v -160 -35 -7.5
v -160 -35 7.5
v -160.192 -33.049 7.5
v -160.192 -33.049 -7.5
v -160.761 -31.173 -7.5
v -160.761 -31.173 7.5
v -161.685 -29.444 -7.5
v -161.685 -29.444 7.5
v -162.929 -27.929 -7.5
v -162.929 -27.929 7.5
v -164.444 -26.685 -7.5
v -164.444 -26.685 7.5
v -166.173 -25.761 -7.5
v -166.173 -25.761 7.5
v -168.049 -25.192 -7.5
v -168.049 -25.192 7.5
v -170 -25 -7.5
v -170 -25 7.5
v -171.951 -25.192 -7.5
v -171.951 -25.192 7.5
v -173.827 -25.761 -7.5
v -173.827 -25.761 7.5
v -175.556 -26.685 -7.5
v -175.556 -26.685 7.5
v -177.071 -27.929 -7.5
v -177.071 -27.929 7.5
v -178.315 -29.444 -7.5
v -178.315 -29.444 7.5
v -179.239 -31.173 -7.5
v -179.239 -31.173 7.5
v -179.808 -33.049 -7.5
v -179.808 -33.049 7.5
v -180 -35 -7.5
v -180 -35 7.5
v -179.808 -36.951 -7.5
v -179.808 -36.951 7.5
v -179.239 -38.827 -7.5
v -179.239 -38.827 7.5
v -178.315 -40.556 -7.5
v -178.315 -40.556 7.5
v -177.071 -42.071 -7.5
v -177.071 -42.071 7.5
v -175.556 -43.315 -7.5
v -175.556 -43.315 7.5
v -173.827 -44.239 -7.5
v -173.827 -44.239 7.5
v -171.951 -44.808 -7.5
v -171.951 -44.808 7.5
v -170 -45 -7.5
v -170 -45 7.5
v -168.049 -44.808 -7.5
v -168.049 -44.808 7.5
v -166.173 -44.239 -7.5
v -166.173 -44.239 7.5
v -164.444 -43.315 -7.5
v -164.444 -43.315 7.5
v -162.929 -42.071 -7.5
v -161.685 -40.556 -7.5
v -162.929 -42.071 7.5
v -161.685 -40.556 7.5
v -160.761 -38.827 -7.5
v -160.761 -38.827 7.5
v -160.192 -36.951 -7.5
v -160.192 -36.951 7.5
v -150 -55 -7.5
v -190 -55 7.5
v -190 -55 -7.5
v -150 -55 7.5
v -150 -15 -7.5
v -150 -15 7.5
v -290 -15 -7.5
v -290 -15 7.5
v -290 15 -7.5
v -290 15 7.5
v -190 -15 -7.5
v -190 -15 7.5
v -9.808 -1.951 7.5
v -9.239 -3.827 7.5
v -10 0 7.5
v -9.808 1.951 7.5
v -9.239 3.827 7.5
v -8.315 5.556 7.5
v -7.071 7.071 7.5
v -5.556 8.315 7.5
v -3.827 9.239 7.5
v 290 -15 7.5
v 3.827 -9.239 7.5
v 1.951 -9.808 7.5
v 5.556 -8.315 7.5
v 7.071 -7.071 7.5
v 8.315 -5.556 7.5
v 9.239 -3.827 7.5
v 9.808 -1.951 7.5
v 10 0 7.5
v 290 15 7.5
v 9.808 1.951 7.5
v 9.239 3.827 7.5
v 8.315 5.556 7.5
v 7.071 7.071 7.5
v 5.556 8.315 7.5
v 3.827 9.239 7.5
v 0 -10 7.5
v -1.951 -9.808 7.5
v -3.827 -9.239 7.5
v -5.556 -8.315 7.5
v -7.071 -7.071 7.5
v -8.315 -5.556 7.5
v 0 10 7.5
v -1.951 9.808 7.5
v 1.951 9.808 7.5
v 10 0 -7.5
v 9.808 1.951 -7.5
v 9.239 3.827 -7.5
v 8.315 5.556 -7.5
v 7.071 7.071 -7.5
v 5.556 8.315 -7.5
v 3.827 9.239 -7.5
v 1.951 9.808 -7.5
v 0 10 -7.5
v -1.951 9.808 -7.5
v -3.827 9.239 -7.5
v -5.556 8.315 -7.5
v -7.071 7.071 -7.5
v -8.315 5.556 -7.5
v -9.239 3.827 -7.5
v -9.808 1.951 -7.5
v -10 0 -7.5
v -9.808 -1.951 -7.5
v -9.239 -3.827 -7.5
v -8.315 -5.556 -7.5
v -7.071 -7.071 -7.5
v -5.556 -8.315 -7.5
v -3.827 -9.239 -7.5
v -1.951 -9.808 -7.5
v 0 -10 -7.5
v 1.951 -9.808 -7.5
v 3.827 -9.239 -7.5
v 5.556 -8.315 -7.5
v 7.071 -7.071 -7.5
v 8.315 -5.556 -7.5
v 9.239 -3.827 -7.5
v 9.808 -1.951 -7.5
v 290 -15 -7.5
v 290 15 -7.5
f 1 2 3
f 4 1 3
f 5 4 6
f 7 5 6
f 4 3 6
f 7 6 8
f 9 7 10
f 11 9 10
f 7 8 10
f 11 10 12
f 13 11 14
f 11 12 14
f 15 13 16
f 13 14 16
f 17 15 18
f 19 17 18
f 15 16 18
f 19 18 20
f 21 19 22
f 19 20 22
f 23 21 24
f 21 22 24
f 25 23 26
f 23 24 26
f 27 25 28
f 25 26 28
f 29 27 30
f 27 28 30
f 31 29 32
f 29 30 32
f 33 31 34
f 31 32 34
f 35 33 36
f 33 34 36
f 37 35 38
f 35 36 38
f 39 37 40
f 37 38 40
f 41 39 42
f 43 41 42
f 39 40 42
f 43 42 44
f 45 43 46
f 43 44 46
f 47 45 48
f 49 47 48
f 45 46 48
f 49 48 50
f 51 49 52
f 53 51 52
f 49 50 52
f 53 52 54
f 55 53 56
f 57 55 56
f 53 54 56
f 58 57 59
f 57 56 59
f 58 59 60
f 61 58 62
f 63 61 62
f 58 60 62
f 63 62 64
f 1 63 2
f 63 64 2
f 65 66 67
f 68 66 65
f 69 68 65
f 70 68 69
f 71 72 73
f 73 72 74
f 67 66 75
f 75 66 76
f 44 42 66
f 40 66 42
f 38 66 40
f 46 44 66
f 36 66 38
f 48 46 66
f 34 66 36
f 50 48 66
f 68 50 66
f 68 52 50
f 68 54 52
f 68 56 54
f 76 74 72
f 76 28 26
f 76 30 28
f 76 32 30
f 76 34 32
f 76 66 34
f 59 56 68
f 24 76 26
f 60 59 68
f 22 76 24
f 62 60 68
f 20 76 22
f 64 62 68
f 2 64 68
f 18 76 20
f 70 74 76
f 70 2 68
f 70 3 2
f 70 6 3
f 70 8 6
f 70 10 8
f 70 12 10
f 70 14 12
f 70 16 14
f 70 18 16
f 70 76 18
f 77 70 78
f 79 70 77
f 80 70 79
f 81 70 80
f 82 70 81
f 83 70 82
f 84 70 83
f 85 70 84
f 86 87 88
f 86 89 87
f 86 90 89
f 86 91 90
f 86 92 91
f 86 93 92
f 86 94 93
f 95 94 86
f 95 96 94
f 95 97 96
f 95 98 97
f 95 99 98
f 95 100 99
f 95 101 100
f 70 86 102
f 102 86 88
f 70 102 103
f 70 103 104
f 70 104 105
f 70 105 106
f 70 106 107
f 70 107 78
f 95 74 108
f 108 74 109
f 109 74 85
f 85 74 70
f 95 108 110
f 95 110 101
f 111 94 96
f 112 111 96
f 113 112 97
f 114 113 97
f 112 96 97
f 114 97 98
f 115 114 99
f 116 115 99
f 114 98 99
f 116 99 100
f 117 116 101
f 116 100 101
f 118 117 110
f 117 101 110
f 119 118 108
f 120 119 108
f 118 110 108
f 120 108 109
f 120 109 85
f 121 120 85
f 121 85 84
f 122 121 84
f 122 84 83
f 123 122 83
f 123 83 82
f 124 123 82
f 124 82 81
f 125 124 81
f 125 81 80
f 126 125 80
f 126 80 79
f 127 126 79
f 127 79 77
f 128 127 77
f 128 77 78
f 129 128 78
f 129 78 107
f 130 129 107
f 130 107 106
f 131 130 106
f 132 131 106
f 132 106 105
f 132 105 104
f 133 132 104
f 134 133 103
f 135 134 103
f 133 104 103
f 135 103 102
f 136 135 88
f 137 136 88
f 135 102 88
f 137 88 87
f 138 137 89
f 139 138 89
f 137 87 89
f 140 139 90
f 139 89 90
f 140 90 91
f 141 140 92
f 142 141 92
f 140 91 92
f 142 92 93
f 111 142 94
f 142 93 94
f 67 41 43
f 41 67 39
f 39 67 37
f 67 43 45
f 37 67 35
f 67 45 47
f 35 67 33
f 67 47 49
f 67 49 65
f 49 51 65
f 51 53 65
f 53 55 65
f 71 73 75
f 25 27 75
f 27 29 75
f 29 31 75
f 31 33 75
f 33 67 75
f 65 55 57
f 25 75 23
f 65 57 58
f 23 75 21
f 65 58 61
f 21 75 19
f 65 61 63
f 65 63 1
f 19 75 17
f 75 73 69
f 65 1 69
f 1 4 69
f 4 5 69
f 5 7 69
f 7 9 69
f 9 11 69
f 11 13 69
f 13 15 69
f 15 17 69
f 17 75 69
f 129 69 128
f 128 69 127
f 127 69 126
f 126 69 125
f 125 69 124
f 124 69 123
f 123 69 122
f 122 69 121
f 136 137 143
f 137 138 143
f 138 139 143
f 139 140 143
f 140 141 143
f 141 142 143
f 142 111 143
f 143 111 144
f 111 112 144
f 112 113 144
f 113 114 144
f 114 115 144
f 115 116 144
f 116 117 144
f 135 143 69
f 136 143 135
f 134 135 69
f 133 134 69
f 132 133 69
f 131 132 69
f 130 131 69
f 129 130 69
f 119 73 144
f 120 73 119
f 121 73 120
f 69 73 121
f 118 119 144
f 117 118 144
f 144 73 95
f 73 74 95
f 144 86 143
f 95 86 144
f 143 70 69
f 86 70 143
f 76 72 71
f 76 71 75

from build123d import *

# Parameters (mm, degrees)
SKETCH1_W           = 580
SKETCH1_H           = 30
BOSS_EXTRUDE1_DEPTH = 7.5
SKETCH2_R           = 10
CUT_EXTRUDE1_DEPTH  = 20
SKETCH3_W           = 40
SKETCH3_H           = 40
SKETCH3_R           = 10
BOSS_EXTRUDE2_DEPTH = 15


with BuildPart() as part:
    # Sketch1 → Boss-Extrude1 (new body, symmetric)
    with BuildSketch(Plane.XY):
        Rectangle(SKETCH1_W, SKETCH1_H)
    extrude(amount=BOSS_EXTRUDE1_DEPTH, both=True)

    # Sketch2 → Cut-Extrude1 (cut)
    with BuildSketch(Plane.XY.offset(7.5)):
        Circle(SKETCH2_R)
    extrude(amount=-CUT_EXTRUDE1_DEPTH, mode=Mode.SUBTRACT)

    # Sketch3 → Boss-Extrude2 (add)
    with BuildSketch(Plane.XY.offset(7.5)):
        with Locations((-170, -35)):
            Rectangle(SKETCH3_W, SKETCH3_H)
        with Locations((-170, -35)):
            Circle(SKETCH3_R, mode=Mode.SUBTRACT)
    extrude(amount=-BOSS_EXTRUDE2_DEPTH)


solid = part.part
